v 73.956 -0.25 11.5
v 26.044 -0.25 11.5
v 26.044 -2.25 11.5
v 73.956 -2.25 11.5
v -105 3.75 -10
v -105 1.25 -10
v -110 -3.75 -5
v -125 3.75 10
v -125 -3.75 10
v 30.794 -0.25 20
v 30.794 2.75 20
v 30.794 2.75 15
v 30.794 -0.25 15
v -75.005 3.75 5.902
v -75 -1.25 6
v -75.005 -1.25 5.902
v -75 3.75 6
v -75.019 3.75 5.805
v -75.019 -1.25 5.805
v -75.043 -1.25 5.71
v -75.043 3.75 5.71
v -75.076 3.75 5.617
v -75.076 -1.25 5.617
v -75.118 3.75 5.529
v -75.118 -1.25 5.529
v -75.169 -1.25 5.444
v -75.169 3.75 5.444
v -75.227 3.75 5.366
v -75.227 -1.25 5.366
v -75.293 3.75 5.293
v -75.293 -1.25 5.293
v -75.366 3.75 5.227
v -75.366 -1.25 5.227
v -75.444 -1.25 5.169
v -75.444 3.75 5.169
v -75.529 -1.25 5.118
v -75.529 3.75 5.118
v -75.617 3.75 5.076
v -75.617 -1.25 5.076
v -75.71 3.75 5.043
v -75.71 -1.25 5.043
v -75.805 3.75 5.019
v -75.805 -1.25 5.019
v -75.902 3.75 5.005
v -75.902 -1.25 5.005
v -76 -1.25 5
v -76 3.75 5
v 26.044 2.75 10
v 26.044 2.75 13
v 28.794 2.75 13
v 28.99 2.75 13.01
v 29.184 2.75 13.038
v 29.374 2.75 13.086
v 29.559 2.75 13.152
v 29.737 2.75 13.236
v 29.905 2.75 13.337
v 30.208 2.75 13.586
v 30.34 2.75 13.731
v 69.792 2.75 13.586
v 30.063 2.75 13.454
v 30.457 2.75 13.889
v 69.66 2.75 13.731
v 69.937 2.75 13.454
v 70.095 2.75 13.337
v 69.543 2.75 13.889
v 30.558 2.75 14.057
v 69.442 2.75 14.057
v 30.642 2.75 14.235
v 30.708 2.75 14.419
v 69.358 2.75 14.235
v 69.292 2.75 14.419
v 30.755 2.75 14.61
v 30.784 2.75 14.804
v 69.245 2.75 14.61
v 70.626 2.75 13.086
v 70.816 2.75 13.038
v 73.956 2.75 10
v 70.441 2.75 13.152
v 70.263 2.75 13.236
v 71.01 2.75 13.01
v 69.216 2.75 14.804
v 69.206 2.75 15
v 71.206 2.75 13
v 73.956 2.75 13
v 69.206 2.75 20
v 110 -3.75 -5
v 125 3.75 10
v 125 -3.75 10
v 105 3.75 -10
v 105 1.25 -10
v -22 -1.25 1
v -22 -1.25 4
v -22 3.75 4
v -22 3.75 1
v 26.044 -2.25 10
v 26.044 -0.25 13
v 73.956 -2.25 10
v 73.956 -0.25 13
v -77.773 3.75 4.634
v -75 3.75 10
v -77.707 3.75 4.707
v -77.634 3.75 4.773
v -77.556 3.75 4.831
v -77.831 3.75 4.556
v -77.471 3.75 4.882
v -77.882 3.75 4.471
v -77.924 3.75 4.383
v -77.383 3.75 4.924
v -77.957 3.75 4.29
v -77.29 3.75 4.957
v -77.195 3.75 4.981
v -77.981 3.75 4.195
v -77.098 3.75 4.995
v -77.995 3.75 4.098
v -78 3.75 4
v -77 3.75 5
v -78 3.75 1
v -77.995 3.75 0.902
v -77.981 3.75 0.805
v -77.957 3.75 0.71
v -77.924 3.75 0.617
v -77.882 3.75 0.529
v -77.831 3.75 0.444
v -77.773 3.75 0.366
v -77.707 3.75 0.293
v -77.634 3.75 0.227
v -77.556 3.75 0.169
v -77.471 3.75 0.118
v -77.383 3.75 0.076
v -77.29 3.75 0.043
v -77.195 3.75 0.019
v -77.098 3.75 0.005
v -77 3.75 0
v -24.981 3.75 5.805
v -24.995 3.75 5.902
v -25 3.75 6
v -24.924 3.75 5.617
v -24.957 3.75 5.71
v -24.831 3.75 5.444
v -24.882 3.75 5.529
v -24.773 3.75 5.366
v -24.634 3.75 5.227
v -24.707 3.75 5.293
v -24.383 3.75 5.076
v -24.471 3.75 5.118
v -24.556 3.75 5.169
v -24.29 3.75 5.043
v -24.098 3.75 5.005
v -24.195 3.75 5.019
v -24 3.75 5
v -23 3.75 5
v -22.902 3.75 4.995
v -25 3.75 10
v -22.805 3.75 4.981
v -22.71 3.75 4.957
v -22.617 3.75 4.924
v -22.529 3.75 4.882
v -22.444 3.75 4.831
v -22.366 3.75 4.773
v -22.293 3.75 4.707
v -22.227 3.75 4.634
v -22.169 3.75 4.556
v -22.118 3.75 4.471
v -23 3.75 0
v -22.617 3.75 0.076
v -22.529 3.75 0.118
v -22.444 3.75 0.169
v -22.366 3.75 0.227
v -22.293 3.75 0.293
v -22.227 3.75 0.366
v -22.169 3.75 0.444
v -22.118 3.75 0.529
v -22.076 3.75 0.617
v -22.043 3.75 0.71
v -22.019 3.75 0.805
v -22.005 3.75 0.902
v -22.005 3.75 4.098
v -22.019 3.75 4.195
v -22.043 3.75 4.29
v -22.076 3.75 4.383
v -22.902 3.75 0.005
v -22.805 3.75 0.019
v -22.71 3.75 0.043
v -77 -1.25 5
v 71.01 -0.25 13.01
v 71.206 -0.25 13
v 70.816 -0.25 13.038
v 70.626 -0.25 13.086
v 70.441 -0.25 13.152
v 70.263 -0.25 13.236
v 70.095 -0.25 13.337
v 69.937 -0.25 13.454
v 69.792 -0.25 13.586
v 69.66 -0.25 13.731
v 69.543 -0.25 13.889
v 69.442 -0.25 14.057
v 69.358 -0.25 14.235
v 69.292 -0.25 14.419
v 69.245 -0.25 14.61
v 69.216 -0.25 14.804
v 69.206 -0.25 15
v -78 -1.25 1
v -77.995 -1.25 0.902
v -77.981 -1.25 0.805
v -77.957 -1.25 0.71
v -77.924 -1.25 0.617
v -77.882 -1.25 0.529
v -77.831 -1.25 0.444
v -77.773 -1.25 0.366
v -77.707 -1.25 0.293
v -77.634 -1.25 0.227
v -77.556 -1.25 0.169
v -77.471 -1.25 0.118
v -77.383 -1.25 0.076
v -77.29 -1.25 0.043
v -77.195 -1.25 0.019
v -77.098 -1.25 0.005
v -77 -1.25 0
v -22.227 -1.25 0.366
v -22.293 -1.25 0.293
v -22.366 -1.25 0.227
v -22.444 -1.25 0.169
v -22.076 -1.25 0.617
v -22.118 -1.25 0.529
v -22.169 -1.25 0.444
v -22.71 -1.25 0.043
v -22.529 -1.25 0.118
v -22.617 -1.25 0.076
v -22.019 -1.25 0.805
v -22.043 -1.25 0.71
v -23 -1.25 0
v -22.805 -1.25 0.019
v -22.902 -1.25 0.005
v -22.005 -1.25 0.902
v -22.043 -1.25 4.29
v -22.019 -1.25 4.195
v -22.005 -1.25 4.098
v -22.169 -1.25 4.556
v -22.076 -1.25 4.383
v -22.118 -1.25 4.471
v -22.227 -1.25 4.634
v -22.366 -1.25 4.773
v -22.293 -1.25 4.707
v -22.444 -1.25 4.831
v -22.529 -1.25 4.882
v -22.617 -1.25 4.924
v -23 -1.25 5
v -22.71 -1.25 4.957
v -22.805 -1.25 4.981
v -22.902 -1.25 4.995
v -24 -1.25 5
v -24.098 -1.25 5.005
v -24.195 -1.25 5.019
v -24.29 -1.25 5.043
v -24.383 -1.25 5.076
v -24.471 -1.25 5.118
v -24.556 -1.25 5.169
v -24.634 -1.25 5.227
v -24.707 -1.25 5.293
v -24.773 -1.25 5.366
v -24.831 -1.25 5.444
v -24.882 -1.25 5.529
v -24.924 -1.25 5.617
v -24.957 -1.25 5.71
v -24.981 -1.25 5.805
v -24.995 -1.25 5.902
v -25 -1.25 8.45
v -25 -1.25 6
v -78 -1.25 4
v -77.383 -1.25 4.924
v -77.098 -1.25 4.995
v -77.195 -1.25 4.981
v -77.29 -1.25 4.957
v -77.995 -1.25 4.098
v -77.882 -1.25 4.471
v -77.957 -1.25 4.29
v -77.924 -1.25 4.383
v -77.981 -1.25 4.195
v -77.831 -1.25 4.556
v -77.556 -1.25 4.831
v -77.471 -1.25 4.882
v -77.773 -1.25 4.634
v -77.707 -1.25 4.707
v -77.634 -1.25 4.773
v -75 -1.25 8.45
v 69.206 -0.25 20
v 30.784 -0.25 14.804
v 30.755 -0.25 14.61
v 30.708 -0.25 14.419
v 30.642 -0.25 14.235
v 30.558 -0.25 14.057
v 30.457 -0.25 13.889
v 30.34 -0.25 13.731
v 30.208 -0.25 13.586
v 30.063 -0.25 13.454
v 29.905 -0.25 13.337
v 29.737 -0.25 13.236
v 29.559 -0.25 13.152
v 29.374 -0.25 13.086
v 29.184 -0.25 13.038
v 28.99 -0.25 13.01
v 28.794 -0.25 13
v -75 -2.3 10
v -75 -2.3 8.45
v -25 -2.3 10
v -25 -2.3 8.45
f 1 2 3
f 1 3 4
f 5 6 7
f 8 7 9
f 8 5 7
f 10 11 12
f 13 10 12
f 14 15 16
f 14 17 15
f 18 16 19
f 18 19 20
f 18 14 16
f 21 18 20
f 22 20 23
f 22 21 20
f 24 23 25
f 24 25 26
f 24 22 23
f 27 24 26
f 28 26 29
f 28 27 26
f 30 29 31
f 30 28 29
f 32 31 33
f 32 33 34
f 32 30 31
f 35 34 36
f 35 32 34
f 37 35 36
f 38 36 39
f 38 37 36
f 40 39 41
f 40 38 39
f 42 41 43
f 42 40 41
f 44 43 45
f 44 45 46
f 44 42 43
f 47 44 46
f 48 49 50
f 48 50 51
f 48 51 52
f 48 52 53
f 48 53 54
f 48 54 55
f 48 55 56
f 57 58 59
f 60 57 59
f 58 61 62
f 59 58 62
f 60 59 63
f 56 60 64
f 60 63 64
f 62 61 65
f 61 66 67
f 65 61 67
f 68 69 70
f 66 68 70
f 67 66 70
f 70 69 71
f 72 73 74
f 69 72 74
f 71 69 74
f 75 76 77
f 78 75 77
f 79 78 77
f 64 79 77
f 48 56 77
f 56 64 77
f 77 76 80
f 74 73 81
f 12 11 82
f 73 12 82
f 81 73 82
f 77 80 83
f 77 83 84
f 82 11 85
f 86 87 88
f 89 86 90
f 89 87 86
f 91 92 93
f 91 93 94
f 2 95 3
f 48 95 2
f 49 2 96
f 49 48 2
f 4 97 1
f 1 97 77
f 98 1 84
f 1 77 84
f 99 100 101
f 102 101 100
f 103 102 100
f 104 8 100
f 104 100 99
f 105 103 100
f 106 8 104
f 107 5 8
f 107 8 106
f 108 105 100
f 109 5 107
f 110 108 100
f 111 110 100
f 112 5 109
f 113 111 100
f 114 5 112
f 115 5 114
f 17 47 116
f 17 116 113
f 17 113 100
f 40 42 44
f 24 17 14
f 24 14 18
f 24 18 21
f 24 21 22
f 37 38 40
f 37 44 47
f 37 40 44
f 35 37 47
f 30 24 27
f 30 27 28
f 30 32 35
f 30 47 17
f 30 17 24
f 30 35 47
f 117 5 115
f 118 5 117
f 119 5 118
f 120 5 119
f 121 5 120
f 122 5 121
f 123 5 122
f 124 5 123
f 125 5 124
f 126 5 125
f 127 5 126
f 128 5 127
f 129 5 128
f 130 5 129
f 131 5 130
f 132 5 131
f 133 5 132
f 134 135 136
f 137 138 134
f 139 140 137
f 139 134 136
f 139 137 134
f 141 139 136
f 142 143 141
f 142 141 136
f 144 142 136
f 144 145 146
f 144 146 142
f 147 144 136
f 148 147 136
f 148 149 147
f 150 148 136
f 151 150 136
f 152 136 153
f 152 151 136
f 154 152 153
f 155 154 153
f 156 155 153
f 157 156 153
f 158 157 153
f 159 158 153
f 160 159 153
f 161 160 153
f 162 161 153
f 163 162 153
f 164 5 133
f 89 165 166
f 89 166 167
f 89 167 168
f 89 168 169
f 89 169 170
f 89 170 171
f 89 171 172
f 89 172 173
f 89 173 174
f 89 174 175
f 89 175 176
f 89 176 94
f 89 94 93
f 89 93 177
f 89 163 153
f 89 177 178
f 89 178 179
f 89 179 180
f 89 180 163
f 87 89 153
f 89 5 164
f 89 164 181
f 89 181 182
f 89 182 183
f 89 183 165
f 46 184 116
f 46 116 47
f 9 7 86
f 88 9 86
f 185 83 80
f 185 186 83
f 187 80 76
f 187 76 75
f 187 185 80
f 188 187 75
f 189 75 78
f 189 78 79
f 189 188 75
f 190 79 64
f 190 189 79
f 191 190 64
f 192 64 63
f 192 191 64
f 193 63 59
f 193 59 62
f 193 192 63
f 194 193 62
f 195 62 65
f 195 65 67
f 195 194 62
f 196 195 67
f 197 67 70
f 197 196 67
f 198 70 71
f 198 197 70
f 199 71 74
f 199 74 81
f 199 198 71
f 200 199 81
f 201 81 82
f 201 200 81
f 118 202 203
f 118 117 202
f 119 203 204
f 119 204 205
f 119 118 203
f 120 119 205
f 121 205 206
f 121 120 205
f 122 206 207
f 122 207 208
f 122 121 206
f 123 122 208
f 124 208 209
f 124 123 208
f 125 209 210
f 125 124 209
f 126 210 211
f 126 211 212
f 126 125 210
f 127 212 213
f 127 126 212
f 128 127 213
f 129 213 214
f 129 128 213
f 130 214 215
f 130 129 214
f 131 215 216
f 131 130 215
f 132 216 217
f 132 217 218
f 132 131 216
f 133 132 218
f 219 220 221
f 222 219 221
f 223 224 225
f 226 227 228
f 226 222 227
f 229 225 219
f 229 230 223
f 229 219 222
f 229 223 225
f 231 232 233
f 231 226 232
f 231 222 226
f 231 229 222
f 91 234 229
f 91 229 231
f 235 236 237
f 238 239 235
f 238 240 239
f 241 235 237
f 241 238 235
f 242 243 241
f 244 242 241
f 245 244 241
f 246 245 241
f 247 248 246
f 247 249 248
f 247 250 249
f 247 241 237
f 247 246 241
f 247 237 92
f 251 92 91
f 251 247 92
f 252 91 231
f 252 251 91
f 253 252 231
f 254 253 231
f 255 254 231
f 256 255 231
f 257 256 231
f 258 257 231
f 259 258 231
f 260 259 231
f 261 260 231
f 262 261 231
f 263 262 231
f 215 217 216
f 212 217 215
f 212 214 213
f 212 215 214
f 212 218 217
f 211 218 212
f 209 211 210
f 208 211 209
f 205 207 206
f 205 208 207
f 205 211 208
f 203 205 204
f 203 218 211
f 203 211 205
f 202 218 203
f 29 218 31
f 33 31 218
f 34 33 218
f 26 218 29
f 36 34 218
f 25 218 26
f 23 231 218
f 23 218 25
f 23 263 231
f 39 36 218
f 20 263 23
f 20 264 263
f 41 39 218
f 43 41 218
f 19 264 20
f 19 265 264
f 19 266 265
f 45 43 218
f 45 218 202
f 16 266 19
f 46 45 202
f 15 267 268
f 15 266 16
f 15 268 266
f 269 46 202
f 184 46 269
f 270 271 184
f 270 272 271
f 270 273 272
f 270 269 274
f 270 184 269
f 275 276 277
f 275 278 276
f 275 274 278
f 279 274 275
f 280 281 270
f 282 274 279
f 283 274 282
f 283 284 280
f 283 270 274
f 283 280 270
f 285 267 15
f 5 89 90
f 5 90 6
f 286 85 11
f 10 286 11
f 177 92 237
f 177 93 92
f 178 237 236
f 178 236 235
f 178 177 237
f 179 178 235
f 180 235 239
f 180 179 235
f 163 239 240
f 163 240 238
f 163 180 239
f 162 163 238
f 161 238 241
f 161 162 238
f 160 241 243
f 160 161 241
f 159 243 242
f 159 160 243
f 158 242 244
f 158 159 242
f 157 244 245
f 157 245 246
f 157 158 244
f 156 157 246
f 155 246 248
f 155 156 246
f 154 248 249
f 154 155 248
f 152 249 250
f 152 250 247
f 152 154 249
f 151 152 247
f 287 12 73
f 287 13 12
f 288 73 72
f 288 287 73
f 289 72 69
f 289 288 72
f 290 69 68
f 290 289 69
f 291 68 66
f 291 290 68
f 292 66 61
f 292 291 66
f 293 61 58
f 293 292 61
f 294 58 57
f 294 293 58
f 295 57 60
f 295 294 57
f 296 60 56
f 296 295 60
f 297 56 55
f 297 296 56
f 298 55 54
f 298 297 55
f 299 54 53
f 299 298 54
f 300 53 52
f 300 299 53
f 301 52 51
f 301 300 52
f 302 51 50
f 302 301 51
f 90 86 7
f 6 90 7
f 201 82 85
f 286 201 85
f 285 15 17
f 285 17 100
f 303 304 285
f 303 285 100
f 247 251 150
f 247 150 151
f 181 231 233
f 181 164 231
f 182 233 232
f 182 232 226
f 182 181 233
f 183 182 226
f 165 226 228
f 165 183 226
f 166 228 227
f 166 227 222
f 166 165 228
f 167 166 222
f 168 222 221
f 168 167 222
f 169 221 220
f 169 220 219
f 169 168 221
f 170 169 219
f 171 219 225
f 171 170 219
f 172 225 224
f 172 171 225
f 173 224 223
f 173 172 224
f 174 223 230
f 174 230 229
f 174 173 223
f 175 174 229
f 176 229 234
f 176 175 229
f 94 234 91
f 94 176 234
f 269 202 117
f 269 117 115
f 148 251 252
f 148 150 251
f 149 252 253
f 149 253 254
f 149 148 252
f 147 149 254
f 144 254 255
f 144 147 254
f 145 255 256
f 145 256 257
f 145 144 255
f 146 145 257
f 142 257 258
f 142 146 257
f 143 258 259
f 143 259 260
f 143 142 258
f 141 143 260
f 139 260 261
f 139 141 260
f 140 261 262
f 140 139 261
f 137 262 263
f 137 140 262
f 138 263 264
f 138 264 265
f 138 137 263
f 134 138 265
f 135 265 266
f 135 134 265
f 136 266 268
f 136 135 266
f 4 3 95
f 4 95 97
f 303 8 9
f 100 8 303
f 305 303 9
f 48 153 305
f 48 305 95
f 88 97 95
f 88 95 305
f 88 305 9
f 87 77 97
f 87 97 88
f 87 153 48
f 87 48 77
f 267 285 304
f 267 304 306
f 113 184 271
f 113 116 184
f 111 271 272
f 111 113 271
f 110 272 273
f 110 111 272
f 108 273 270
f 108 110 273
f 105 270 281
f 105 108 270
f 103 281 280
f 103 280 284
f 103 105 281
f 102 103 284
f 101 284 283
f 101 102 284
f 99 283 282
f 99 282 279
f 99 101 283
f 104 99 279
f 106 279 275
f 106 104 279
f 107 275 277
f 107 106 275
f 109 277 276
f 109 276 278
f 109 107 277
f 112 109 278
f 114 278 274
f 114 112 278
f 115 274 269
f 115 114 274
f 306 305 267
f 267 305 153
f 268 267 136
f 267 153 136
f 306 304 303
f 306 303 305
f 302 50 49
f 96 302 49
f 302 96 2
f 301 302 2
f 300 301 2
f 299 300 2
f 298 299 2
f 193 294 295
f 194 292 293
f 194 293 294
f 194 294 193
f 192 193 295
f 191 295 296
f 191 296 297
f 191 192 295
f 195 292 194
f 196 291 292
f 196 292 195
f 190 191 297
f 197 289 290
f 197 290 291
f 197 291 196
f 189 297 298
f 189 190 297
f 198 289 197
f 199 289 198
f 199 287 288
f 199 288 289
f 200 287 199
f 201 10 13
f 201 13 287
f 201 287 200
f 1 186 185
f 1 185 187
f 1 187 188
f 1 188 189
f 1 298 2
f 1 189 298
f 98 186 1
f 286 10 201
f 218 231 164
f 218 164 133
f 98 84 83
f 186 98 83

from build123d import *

# Parameters (mm, degrees)
BOSS_EXTRUDE1_DEPTH     = 3.75
BOSS_EXTRUDE3_DEPTH     = 3
SKETCH8_W               = 47.9125
SKETCH8_H               = 1.5
BOSS_EXTRUDE5_DEPTH     = 2
FILLET4_R               = 2
CUT_EXTRUDE1_DEPTH      = 127.75665663
CUT_EXTRUDE1_DEPTH_BACK = 4
SKETCH9_W               = 50
SKETCH9_H               = 1.55
CUT_EXTRUDE2_DEPTH      = 1.05
FILLET6_R               = 1
CHAMFER1_SIZE           = 5


with BuildPart() as part:
    # Sketch1 → Boss-Extrude1 (new, symmetric)
    with BuildSketch(Plane(origin=(0, 0, 0), x_dir=(1, 0, 0), z_dir=(0, 1, 0))):
        Polygon((-125, -10), (125, -10), (105, 10), (-105, 10), align=None)
    extrude(amount=BOSS_EXTRUDE1_DEPTH, both=True)

    # Sketch3 → Boss-Extrude3 (add)
    with BuildSketch(Plane(origin=(0, 2.75, 0), x_dir=(-1, 0, 0), z_dir=(0, 1, 0))):
        Polygon((-69.20625, 20), (-30.79375, 20), (-30.79375, 13), (-26.04375, 13), (-26.04375, 10), (-73.95625, 10), (-73.95625, 13), (-69.20625, 13), align=None)
    extrude(amount=-BOSS_EXTRUDE3_DEPTH)

    # Sketch8 → Boss-Extrude5 (add)
    with BuildSketch(Plane.XZ.offset(0.25)):
        with Locations((50, 10.75)):
            Rectangle(SKETCH8_W, SKETCH8_H)
    extrude(amount=BOSS_EXTRUDE5_DEPTH)

    # Fillet4
    fillet4_edges = [part.edges().sort_by_distance(p)[0] for p in [
        (30.79375, 1.25, 13),
        (69.20625, 1.25, 13),
    ]]
    fillet(fillet4_edges, radius=FILLET4_R)

    # Sketch4 → Cut-Extrude1 (cut, two sides: drawn at the far end of the back side and taken through both)
    with BuildSketch(Plane(origin=(0, 2.75, 0), x_dir=(-1, 0, 0), z_dir=(0, 1, 0)).offset(-CUT_EXTRUDE1_DEPTH_BACK)):
        Polygon((22, 0), (78, 0), (78, 5), (75, 5), (75, 10), (25, 10), (25, 5), (22, 5), align=None)
    extrude(amount=CUT_EXTRUDE1_DEPTH + CUT_EXTRUDE1_DEPTH_BACK, mode=Mode.SUBTRACT)

    # Sketch9 → Cut-Extrude2 (cut)
    with BuildSketch(Plane(origin=(0, -1.25, 0), x_dir=(1, 0, 0), z_dir=(0, 1, 0))):
        with Locations((-50, -9.225)):
            Rectangle(SKETCH9_W, SKETCH9_H)
    extrude(amount=-CUT_EXTRUDE2_DEPTH, mode=Mode.SUBTRACT)

    # Fillet6
    fillet6_edges = [part.edges().sort_by_distance(p)[0] for p in [
        (-75, 1.25, 5),
        (-22, 1.25, 0),
        (-78, 1.25, 0),
        (-78, 1.25, 5),
        (-25, 1.25, 5),
        (-22, 1.25, 5),
    ]]
    fillet(fillet6_edges, radius=FILLET6_R)

    # Chamfer1
    chamfer1_edges = [part.edges().sort_by_distance(p)[0] for p in [
        (0, -3.75, -10),
    ]]
    chamfer(chamfer1_edges, length=CHAMFER1_SIZE)


solid = part.part
